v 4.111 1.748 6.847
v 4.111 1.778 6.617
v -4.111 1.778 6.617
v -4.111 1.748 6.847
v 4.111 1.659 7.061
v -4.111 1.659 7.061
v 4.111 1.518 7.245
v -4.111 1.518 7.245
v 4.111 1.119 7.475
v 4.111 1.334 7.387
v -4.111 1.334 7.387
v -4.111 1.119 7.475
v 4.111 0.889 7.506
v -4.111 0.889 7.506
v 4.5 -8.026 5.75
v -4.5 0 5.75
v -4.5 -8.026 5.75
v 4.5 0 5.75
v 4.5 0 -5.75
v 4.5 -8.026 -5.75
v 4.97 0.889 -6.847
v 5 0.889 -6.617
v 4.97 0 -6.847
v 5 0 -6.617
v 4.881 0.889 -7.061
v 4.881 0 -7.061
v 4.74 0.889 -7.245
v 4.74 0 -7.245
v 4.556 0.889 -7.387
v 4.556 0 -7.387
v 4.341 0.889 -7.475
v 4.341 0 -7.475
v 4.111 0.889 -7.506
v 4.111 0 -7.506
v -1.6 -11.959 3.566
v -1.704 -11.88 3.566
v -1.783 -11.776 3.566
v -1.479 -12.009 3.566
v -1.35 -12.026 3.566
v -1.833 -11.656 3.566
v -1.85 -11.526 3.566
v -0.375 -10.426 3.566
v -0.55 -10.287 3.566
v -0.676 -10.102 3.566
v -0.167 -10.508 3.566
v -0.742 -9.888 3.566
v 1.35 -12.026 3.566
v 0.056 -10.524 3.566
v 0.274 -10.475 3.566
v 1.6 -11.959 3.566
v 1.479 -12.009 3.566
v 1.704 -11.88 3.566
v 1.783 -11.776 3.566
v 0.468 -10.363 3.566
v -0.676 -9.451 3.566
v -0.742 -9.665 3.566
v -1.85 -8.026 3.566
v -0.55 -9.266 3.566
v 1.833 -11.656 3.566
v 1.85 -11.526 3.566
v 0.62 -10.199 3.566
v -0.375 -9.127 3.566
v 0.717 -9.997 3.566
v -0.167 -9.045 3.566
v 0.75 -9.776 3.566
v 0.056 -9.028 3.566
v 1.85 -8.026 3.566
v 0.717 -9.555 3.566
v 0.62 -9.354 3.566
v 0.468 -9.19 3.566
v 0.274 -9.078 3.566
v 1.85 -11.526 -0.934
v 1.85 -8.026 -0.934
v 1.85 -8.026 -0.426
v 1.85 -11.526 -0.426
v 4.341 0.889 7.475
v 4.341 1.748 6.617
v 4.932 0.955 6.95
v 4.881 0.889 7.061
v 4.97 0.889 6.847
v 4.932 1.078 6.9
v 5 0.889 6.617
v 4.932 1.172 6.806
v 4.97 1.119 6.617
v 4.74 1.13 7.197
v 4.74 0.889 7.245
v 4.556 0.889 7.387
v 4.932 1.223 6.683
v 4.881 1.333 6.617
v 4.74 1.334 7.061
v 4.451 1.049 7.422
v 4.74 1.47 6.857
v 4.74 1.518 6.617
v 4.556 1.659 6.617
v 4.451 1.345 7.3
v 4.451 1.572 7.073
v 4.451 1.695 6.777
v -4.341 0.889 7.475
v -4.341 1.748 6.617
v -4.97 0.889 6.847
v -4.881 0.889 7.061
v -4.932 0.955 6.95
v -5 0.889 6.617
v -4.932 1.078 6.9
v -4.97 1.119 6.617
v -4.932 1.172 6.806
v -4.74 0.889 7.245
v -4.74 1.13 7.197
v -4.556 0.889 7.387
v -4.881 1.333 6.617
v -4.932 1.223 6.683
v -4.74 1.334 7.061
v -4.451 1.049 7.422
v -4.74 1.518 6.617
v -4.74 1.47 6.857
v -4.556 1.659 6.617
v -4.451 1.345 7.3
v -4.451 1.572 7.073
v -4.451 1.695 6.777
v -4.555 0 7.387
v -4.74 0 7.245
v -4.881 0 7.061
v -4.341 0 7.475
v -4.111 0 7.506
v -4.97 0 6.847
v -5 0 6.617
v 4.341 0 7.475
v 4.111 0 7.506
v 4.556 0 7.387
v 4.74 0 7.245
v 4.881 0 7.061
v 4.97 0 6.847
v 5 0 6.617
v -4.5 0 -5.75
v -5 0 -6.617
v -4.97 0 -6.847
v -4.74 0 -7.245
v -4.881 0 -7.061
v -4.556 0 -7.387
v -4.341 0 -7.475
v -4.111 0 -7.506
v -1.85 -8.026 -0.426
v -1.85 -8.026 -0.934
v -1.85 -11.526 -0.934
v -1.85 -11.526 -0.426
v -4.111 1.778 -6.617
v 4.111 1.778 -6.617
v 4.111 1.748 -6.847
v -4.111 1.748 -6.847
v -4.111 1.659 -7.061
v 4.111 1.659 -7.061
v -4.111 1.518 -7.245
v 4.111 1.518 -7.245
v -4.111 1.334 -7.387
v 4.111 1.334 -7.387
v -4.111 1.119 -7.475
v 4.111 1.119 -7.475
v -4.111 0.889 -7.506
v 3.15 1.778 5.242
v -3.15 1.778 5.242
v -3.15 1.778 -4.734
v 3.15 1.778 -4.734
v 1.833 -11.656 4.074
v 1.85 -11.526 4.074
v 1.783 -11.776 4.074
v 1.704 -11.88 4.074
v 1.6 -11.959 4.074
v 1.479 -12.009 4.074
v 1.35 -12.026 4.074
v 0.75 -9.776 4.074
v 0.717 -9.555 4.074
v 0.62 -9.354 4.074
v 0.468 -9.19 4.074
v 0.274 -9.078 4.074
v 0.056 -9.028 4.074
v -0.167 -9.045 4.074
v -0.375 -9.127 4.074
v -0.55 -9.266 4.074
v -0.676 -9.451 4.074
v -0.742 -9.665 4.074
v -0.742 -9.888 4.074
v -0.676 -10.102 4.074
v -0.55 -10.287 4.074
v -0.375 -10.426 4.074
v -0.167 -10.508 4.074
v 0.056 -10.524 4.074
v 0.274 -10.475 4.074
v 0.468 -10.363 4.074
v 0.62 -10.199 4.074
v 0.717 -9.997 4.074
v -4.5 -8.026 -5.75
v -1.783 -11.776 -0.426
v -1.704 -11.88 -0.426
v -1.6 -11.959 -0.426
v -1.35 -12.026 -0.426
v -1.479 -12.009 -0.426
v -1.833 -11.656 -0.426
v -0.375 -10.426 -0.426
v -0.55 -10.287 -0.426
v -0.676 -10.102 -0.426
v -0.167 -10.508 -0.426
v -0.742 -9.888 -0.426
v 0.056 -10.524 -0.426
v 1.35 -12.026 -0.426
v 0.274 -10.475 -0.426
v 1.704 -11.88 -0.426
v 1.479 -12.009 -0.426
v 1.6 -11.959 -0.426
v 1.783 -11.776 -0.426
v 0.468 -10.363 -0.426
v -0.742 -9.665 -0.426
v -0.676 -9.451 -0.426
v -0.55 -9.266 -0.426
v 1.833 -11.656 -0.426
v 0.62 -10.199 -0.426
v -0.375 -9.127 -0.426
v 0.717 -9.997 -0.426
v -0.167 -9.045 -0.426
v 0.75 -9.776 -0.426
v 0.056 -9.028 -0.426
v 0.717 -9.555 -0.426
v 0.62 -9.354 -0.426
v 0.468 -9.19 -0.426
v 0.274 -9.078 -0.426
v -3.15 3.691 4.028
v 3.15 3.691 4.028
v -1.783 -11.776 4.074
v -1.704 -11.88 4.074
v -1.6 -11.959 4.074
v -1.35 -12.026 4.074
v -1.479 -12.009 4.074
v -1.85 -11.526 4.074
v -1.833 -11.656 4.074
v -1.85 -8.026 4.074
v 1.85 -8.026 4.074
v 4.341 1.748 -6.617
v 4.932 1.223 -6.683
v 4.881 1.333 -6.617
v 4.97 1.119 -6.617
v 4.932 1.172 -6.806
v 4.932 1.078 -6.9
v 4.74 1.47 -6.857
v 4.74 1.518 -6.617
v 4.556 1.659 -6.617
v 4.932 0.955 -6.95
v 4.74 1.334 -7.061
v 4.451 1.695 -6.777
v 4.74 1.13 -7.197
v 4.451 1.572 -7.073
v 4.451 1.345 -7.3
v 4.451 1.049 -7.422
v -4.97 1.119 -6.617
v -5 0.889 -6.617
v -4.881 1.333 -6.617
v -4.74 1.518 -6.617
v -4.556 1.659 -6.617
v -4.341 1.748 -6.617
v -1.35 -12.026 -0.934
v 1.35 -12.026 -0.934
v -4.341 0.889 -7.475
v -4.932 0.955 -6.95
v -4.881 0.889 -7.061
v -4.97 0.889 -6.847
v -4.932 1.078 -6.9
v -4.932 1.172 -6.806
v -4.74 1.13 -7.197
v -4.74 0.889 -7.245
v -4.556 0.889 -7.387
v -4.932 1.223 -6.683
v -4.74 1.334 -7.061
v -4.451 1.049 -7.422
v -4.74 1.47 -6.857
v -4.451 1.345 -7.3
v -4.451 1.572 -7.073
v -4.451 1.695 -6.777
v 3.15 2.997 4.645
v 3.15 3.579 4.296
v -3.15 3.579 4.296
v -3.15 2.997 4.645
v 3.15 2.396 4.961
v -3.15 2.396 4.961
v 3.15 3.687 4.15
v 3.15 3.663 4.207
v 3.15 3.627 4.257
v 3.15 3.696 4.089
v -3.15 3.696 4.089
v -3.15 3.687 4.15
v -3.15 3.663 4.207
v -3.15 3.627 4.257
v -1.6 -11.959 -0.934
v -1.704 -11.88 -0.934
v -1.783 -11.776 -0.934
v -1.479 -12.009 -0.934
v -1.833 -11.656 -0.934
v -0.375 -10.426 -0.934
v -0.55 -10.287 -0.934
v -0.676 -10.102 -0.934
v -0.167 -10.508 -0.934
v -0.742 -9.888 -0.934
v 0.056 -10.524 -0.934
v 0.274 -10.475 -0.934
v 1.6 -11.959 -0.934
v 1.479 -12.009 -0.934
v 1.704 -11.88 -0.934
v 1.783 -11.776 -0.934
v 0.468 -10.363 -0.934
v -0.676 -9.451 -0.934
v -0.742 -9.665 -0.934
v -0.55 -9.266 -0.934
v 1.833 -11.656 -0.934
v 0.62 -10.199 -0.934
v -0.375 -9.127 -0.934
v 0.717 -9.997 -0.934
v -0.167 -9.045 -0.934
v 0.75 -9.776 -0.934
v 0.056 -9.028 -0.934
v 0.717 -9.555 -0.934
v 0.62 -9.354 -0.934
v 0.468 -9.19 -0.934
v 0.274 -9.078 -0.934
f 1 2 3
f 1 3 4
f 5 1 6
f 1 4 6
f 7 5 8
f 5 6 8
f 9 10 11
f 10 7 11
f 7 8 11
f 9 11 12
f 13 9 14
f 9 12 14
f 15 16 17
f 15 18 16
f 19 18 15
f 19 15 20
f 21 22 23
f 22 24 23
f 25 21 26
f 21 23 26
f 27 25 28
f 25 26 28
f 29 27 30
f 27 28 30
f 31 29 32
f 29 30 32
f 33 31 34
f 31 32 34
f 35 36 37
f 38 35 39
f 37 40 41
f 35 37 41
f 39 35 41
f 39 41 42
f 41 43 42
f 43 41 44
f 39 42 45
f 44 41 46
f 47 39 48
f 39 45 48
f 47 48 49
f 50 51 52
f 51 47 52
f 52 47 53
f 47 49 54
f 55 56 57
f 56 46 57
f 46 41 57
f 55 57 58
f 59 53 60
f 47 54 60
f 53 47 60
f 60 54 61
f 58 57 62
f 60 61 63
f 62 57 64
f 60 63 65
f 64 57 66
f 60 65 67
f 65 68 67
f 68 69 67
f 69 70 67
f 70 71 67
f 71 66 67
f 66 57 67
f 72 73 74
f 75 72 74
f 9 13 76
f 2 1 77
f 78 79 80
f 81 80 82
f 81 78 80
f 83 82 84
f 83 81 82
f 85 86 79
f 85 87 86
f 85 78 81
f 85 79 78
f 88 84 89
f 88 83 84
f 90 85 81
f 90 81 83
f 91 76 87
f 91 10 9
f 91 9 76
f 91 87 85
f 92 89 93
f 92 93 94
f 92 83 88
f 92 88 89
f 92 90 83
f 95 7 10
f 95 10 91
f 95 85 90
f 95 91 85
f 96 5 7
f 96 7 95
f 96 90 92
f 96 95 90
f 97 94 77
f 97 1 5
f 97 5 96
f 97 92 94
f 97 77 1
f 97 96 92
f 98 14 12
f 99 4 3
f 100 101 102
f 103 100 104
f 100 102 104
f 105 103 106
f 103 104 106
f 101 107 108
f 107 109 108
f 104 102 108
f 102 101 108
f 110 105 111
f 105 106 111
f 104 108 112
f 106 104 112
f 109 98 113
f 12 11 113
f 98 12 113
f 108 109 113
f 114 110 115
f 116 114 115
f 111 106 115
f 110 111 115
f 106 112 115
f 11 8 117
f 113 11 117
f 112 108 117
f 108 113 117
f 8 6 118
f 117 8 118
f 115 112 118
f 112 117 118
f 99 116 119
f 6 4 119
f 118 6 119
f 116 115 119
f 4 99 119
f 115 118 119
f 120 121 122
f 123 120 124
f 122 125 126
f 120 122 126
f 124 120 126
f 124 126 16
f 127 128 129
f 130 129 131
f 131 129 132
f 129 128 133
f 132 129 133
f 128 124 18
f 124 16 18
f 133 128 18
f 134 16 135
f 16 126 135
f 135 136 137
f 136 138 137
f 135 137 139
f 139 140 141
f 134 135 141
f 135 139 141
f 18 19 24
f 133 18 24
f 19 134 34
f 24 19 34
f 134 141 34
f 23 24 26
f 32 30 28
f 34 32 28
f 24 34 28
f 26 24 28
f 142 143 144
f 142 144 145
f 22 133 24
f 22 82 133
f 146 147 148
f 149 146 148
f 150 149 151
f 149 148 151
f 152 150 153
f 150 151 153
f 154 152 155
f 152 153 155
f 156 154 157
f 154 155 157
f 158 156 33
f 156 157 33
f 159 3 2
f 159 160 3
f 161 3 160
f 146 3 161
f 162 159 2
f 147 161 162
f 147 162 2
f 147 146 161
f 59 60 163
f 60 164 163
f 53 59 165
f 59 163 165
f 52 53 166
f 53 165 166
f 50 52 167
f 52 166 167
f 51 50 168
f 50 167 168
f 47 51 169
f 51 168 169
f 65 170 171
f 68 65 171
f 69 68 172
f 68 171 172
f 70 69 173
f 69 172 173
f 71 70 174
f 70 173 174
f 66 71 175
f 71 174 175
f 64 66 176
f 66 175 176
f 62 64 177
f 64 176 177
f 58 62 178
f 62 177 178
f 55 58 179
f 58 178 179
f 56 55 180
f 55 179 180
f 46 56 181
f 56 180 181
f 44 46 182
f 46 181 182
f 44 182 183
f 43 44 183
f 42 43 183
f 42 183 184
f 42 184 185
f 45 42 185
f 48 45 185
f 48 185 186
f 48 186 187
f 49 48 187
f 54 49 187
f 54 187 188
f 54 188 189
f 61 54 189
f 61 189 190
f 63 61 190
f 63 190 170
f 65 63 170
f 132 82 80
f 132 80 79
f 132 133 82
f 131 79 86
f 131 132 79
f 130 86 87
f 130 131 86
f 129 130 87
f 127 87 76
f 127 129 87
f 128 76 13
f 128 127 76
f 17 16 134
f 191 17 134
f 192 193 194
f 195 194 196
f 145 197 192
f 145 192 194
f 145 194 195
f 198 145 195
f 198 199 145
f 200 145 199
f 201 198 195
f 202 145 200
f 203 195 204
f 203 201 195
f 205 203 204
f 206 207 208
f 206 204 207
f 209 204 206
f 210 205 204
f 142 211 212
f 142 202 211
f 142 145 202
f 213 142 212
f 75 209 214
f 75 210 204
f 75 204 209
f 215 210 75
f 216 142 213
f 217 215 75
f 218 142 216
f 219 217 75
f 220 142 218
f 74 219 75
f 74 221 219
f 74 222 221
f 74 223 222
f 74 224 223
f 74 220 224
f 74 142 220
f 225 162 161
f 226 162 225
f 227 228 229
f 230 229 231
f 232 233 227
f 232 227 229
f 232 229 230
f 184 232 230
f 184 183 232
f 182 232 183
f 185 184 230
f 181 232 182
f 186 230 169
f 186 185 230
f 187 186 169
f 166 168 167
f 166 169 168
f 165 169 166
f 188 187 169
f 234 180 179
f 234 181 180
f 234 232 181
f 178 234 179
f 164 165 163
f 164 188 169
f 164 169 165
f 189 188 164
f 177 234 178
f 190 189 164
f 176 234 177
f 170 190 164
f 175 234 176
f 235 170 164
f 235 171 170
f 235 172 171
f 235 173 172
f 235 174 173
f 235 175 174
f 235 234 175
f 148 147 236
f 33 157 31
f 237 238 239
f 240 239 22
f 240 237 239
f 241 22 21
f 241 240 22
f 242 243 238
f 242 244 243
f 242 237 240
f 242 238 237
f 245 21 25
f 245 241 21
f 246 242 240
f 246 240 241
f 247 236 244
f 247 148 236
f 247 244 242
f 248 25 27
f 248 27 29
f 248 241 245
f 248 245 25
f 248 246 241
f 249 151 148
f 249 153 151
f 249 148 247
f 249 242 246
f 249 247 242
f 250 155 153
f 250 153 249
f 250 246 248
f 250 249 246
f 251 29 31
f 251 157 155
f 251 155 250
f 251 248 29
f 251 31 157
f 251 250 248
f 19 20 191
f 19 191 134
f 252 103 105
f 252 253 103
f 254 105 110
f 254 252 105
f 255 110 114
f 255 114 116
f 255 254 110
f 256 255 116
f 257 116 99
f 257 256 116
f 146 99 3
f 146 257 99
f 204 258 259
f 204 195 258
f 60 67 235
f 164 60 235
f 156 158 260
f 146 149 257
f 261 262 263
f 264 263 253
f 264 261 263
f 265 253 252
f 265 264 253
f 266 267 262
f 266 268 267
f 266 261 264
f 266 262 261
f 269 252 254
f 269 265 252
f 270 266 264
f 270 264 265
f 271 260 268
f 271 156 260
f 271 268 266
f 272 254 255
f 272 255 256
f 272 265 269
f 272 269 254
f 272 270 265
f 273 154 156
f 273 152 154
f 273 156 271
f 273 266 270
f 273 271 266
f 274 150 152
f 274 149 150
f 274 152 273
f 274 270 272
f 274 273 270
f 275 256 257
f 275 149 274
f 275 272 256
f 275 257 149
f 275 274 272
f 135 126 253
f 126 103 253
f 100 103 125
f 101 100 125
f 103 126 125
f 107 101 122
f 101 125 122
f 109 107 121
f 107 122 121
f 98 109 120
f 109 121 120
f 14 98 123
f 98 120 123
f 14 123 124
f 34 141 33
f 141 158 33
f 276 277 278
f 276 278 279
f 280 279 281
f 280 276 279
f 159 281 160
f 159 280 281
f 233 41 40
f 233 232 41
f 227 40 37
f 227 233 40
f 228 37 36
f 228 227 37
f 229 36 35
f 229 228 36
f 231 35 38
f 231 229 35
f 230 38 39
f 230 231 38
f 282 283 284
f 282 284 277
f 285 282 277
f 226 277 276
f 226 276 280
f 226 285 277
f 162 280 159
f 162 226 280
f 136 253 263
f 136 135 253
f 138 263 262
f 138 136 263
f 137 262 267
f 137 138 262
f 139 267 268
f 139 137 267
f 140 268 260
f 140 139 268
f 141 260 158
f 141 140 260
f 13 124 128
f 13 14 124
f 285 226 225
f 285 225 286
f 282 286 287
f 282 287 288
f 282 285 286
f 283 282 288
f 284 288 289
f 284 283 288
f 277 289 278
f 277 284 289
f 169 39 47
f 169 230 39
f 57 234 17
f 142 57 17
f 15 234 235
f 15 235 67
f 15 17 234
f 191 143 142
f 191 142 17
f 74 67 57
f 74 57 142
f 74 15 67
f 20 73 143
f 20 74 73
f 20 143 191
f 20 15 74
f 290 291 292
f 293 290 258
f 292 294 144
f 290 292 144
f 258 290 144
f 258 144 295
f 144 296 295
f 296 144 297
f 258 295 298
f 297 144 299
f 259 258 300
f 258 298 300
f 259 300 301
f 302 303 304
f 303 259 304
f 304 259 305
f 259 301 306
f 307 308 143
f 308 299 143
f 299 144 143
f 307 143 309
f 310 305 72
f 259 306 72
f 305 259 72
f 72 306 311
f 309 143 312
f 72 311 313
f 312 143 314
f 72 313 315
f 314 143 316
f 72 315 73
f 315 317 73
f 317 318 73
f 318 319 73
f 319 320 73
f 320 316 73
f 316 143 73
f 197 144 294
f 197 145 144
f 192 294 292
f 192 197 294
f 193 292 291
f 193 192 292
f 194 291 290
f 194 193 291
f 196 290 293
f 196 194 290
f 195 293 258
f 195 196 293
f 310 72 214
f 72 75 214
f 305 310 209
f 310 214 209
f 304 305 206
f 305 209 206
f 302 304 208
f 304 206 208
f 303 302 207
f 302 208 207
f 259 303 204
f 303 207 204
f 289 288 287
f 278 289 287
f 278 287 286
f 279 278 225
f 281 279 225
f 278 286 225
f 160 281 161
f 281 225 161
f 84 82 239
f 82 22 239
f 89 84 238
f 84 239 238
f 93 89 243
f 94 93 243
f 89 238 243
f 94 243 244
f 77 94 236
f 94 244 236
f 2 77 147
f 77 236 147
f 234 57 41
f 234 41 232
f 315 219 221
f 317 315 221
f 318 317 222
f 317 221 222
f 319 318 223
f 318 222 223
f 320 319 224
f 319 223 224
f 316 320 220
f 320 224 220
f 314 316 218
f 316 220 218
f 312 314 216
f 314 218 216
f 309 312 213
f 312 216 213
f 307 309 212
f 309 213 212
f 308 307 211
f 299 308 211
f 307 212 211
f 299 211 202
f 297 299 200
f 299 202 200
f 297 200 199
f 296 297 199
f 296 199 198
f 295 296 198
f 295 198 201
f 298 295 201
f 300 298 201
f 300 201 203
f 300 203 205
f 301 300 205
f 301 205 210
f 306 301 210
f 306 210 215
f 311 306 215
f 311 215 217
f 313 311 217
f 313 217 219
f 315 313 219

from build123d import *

# Parameters (mm, degrees)
BOSS_EXTRUDE1_DEPTH = 4.5
SKETCH2_W           = 10
SKETCH2_H           = 15.0114
BOSS_EXTRUDE2_DEPTH = 1.778
FILLET1_R           = 0.889
SKETCH3_W           = 3.7
SKETCH3_H           = 0.508
BOSS_EXTRUDE3_DEPTH = 4
FILLET2_R           = 0.5
SKETCH4_R           = 0.75
CUT_EXTRUDE1_DEPTH  = 12.5797
BOSS_EXTRUDE4_DEPTH = 3.15


with BuildPart() as part:
    # Sketch1 → Boss-Extrude1 (new body, symmetric)
    with BuildSketch(Plane(origin=(0, 0, 0), x_dir=(0, 0, -1), z_dir=(1, 0, 0))):
        Polygon((-5.75, 0), (-5.75, -8.0264), (5.75, -8.0264), (5.75, 0), (7.5057, 0), (7.5057, 1.778), (-7.5057, 1.778), (-7.5057, 0), align=None)
    extrude(amount=BOSS_EXTRUDE1_DEPTH, both=True)

    # Sketch2 → Boss-Extrude2 (add)
    with BuildSketch(Plane(origin=(0, 1.778, 0), x_dir=(1, 0, 0), z_dir=(0, 1, 0))):
        Rectangle(SKETCH2_W, SKETCH2_H)
    extrude(amount=-BOSS_EXTRUDE2_DEPTH)

    # Fillet1
    fillet1_edges = [part.edges().sort_by_distance(p)[0] for p in [
        (0, 1.778, 7.5057),
        (0, 1.778, -7.5057),
        (5, 0.889, 7.5057),
        (5, 1.778, 0),
        (5, 0.889, -7.5057),
        (-5, 0.889, 7.5057),
        (-5, 0.889, -7.5057),
        (-5, 1.778, 0),
    ]]
    fillet(fillet1_edges, radius=FILLET1_R)

    # Sketch3 → Boss-Extrude3 (add)
    with BuildSketch(Plane.XZ.offset(8.0264)):
        with Locations((0, 3.82)):
            Rectangle(SKETCH3_W, SKETCH3_H)
        with Locations((0, -0.68)):
            Rectangle(SKETCH3_W, SKETCH3_H)
    extrude(amount=BOSS_EXTRUDE3_DEPTH)

    # Fillet2
    fillet2_edges = [part.edges().sort_by_distance(p)[0] for p in [
        (1.85, -12.0264, 3.82),
        (-1.85, -12.0264, 3.82),
        (1.85, -12.0264, -0.68),
        (-1.85, -12.0264, -0.68),
    ]]
    fillet(fillet2_edges, radius=FILLET2_R)

    # Sketch4 → Cut-Extrude1 (cut, through all)
    with BuildSketch(Plane.XY.offset(4.074)):
        with Locations((0, -9.7764)):
            Circle(SKETCH4_R)
    extrude(amount=-CUT_EXTRUDE1_DEPTH, mode=Mode.SUBTRACT)

    # Sketch5 → Boss-Extrude4 (add, symmetric)
    with BuildSketch(Plane(origin=(0, 0, 0), x_dir=(0, 0, -1), z_dir=(1, 0, 0))):
        with BuildLine():
            Line((4.734, 1.778), (-4.028021931, 3.690536137))
            ThreePointArc((-4.028021931, 3.690536137), (-4.179670828, 3.676927945), (-4.29629138, 3.579039143))
            ThreePointArc((-4.29629138, 3.579039143), (-4.807252645, 2.698529173), (-5.242, 1.778))
            Line((-5.242, 1.778), (4.734, 1.778))
        make_face()
    extrude(amount=BOSS_EXTRUDE4_DEPTH, both=True)


solid = part.part
